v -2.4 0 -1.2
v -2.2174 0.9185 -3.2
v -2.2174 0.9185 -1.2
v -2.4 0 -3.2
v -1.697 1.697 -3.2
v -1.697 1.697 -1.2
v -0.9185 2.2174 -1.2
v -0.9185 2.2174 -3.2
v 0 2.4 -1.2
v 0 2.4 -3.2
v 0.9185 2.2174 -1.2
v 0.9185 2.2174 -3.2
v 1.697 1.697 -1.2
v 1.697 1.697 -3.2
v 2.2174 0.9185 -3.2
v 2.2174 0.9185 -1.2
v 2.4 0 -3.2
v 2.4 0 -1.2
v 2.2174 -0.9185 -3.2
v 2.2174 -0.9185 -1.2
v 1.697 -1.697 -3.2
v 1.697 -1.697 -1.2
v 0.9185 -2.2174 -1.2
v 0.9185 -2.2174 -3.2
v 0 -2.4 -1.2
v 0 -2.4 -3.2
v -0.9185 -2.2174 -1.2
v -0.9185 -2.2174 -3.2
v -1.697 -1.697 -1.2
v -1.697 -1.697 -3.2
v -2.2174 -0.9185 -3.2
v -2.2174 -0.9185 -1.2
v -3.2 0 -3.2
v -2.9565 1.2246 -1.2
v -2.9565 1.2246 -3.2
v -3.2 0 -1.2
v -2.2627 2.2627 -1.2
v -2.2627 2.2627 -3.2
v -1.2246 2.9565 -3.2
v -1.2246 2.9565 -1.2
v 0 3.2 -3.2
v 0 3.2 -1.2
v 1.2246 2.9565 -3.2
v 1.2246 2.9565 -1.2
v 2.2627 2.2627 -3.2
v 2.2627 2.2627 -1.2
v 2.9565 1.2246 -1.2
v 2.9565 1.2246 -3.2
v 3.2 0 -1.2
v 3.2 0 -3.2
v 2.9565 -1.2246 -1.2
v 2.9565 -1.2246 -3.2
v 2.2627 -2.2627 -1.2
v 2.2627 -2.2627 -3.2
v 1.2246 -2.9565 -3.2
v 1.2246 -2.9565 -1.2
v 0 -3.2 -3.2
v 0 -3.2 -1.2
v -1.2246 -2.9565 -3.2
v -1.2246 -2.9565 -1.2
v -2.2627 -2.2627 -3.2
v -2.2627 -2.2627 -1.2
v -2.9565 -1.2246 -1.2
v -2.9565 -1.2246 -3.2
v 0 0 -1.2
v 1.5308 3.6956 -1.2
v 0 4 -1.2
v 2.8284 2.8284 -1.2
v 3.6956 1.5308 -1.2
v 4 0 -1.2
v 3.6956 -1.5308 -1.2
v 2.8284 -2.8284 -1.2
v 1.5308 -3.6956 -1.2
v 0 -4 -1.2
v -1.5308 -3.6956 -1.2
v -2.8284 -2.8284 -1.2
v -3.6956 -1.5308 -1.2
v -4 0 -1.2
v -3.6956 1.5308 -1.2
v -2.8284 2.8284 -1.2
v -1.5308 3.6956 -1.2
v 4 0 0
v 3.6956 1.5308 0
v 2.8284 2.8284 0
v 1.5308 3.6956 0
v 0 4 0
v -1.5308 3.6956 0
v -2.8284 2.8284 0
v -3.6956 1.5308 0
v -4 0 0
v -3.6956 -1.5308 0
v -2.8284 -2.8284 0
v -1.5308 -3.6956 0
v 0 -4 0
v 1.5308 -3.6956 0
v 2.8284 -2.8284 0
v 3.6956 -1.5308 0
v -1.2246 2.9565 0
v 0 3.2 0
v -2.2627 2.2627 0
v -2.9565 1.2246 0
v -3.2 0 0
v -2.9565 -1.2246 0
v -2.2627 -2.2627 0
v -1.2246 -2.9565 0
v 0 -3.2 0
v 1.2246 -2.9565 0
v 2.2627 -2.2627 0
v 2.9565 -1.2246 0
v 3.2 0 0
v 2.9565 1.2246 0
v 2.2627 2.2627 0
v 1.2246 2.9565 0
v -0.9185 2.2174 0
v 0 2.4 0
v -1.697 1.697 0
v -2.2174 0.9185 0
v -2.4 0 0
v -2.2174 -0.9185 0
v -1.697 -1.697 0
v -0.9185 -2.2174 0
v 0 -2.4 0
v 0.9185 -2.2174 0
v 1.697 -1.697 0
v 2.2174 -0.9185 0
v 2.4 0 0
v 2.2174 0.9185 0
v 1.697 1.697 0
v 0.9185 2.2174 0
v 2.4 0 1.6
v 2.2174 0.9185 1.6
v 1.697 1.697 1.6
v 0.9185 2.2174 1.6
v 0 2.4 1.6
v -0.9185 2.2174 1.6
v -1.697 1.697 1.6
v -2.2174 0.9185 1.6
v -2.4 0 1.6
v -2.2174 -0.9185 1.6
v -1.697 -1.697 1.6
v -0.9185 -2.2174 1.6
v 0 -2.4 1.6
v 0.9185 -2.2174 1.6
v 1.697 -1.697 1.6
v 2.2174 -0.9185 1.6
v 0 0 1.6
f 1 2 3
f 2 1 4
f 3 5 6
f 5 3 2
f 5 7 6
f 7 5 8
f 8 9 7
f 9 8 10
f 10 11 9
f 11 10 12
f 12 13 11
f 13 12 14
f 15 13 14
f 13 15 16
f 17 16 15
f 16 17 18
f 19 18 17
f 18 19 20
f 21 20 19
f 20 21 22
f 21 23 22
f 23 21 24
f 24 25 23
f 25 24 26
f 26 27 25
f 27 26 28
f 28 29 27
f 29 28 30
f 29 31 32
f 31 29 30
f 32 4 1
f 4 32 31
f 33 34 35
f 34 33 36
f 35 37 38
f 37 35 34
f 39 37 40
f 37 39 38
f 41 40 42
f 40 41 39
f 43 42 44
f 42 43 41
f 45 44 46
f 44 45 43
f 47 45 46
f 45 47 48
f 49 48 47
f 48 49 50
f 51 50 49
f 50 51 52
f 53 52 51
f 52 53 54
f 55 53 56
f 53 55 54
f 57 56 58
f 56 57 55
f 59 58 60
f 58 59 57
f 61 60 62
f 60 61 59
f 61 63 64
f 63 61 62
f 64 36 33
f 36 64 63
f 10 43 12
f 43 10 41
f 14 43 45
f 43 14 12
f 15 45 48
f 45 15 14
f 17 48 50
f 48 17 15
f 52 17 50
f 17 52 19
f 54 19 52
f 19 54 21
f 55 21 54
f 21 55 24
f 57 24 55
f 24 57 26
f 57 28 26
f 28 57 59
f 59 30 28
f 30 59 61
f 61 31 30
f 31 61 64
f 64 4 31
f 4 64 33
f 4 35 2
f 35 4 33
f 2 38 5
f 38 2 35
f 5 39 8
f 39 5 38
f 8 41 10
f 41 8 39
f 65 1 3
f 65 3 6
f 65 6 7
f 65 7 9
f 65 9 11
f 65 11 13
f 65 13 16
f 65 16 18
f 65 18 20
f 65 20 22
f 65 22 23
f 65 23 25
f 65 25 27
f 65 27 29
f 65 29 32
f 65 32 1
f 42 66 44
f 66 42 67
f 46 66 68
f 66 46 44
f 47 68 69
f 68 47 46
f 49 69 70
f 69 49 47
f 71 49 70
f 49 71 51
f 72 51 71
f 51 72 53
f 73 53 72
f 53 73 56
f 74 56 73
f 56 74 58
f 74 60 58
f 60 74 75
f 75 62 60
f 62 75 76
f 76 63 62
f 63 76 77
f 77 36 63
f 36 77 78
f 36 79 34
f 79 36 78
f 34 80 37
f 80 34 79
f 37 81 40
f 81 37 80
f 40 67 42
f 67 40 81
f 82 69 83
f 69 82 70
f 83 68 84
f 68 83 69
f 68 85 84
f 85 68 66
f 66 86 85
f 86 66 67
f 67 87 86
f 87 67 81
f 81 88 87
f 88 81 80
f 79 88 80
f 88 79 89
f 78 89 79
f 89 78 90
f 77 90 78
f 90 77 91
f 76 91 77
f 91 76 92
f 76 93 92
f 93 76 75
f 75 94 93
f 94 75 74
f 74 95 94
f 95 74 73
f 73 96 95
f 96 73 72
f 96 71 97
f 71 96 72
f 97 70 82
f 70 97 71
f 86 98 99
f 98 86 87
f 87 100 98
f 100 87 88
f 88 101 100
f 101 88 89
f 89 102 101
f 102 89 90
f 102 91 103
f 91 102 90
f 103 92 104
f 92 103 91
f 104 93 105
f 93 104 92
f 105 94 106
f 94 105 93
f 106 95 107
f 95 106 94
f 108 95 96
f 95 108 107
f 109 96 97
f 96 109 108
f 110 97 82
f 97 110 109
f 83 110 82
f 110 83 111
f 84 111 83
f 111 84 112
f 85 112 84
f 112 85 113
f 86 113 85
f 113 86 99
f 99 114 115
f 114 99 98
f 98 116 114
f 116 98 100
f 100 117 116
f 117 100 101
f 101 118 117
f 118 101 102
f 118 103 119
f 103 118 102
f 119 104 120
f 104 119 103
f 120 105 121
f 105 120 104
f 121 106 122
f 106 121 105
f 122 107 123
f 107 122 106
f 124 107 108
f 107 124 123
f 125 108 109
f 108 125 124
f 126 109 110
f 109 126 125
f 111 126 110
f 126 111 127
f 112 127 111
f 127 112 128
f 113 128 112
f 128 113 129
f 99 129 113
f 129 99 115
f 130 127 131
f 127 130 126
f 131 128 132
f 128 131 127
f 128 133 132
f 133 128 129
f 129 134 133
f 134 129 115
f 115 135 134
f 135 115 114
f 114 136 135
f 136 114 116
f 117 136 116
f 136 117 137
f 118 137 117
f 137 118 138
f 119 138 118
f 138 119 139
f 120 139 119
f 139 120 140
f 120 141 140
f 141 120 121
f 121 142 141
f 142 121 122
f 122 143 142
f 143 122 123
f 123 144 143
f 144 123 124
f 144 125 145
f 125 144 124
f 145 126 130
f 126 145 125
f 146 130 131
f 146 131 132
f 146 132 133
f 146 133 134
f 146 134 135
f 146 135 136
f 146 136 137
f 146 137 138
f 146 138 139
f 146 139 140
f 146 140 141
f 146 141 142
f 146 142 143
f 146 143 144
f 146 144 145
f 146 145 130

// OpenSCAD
// file: ../p/4-4edge.scad
use <../lib.scad>
function ldraw_lib__4_4edge() = [
// 0 Circle 1.0
// 0 Name: 4-4edge.dat
// 0 Author: James Jessiman
// 0 !LDRAW_ORG Primitive UPDATE 2017-01
// 0 !LICENSE Licensed under CC BY 2.0 and CC BY 4.0 : see CAreadme.txt
// 
// 0 BFC CERTIFY CCW
  [0,"BFC","CERTIFY"],
  [0,"BFC","CCW"],
// 
// 0 !HISTORY 1998-12-15 [PTadmin] Official Update 1998-10
// 0 !HISTORY 2005-12-28 [PTadmin] Official Update 2005-01
// 0 !HISTORY 2007-06-24 [PTadmin] Header formatted for Contributor Agreement
// 0 !HISTORY 2008-07-01 [PTadmin] Official Update 2008-01
// 0 !HISTORY 2017-01-15 [Steffen] BFCed
// 0 !HISTORY 2017-12-30 [PTadmin] Official Update 2017-01
// 
// 
// 2 24 1 0 0 0.9239 0 0.3827
  [2,24,1,0,0,0.9239,0,0.3827],
// 2 24 0.9239 0 0.3827 0.7071 0 0.7071
  [2,24,0.9239,0,0.3827,0.7071,0,0.7071],
// 2 24 0.7071 0 0.7071 0.3827 0 0.9239
  [2,24,0.7071,0,0.7071,0.3827,0,0.9239],
// 2 24 0.3827 0 0.9239 0 0 1
  [2,24,0.3827,0,0.9239,0,0,1],
// 2 24 0 0 1 -0.3827 0 0.9239
  [2,24,0,0,1,-0.3827,0,0.9239],
// 2 24 -0.3827 0 0.9239 -0.7071 0 0.7071
  [2,24,-0.3827,0,0.9239,-0.7071,0,0.7071],
// 2 24 -0.7071 0 0.7071 -0.9239 0 0.3827
  [2,24,-0.7071,0,0.7071,-0.9239,0,0.3827],
// 2 24 -0.9239 0 0.3827 -1 0 -0
  [2,24,-0.9239,0,0.3827,-1,0,-0],
// 2 24 -1 0 -0 -0.9239 0 -0.3827
  [2,24,-1,0,-0,-0.9239,0,-0.3827],
// 2 24 -0.9239 0 -0.3827 -0.7071 0 -0.7071
  [2,24,-0.9239,0,-0.3827,-0.7071,0,-0.7071],
// 2 24 -0.7071 0 -0.7071 -0.3827 0 -0.9239
  [2,24,-0.7071,0,-0.7071,-0.3827,0,-0.9239],
// 2 24 -0.3827 0 -0.9239 0 0 -1
  [2,24,-0.3827,0,-0.9239,0,0,-1],
// 2 24 0 0 -1 0.3827 0 -0.9239
  [2,24,0,0,-1,0.3827,0,-0.9239],
// 2 24 0.3827 0 -0.9239 0.7071 0 -0.7071
  [2,24,0.3827,0,-0.9239,0.7071,0,-0.7071],
// 2 24 0.7071 0 -0.7071 0.9239 0 -0.3827
  [2,24,0.7071,0,-0.7071,0.9239,0,-0.3827],
// 2 24 0.9239 0 -0.3827 1 0 0
  [2,24,0.9239,0,-0.3827,1,0,0],
];
makepoly(ldraw_lib__4_4edge(), line=0.2);
// file: ../p/4-4cyli.scad
use <../lib.scad>
function ldraw_lib__4_4cyli() = [
// 0 Cylinder 1.0
// 0 Name: 4-4cyli.dat
// 0 Author: James Jessiman
// 0 !LDRAW_ORG Primitive UPDATE 2005-01
// 0 !LICENSE Licensed under CC BY 2.0 and CC BY 4.0 : see CAreadme.txt
// 
// 0 BFC CERTIFY CCW
  [0,"BFC","CERTIFY"],
  [0,"BFC","CCW"],
// 
// 0 !HISTORY 1998-12-15 [PTadmin] Official Update 1998-10
// 0 !HISTORY 2002-03-23 [sbliss] Added BFC statement; merged headers from files in distributions LDraw 0.27 and Complete.
// 0 !HISTORY 2002-04-25 [PTadmin] Official Update 2002-02
// 0 !HISTORY 2004-12-14 [guyvivan] BFC CCW
// 0 !HISTORY 2005-12-28 [PTadmin] Official Update 2005-01
// 0 !HISTORY 2007-06-24 [PTadmin] Header formatted for Contributor Agreement
// 0 !HISTORY 2008-07-01 [PTadmin] Official Update 2008-01
// 
// 
// 4 16 1 1 0 0.9239 1 0.3827 0.9239 0 0.3827 1 0 0
  [4,16,1,1,0,0.9239,1,0.3827,0.9239,0,0.3827,1,0,0],
// 5 24 1 0 0 1 1 0 0.9239 0 0.3827 0.9239 0 -0.3827
  [5,24,1,0,0,1,1,0,0.9239,0,0.3827,0.9239,0,-0.3827],
// 4 16 0.9239 1 0.3827 0.7071 1 0.7071 0.7071 0 0.7071 0.9239 0 0.3827
  [4,16,0.9239,1,0.3827,0.7071,1,0.7071,0.7071,0,0.7071,0.9239,0,0.3827],
// 5 24 0.9239 0 0.3827 0.9239 1 0.3827 0.7071 0 0.7071 1 0 0
  [5,24,0.9239,0,0.3827,0.9239,1,0.3827,0.7071,0,0.7071,1,0,0],
// 4 16 0.7071 1 0.7071 0.3827 1 0.9239 0.3827 0 0.9239 0.7071 0 0.7071
  [4,16,0.7071,1,0.7071,0.3827,1,0.9239,0.3827,0,0.9239,0.7071,0,0.7071],
// 5 24 0.7071 0 0.7071 0.7071 1 0.7071 0.3827 0 0.9239 0.9239 0 0.3827
  [5,24,0.7071,0,0.7071,0.7071,1,0.7071,0.3827,0,0.9239,0.9239,0,0.3827],
// 4 16 0.3827 1 0.9239 0 1 1 0 0 1 0.3827 0 0.9239
  [4,16,0.3827,1,0.9239,0,1,1,0,0,1,0.3827,0,0.9239],
// 5 24 0.3827 0 0.9239 0.3827 1 0.9239 0 0 1 0.7071 0 0.7071
  [5,24,0.3827,0,0.9239,0.3827,1,0.9239,0,0,1,0.7071,0,0.7071],
// 4 16 0 1 1 -0.3827 1 0.9239 -0.3827 0 0.9239 0 0 1
  [4,16,0,1,1,-0.3827,1,0.9239,-0.3827,0,0.9239,0,0,1],
// 5 24 0 0 1 0 1 1 -0.3827 0 0.9239 0.3827 0 0.9239
  [5,24,0,0,1,0,1,1,-0.3827,0,0.9239,0.3827,0,0.9239],
// 4 16 -0.3827 1 0.9239 -0.7071 1 0.7071 -0.7071 0 0.7071 -0.3827 0 0.9239
  [4,16,-0.3827,1,0.9239,-0.7071,1,0.7071,-0.7071,0,0.7071,-0.3827,0,0.9239],
// 5 24 -0.3827 0 0.9239 -0.3827 1 0.9239 -0.7071 0 0.7071 0 0 1
  [5,24,-0.3827,0,0.9239,-0.3827,1,0.9239,-0.7071,0,0.7071,0,0,1],
// 4 16 -0.7071 1 0.7071 -0.9239 1 0.3827 -0.9239 0 0.3827 -0.7071 0 0.7071
  [4,16,-0.7071,1,0.7071,-0.9239,1,0.3827,-0.9239,0,0.3827,-0.7071,0,0.7071],
// 5 24 -0.7071 0 0.7071 -0.7071 1 0.7071 -0.9239 0 0.3827 -0.3827 0 0.9239
  [5,24,-0.7071,0,0.7071,-0.7071,1,0.7071,-0.9239,0,0.3827,-0.3827,0,0.9239],
// 4 16 -0.9239 1 0.3827 -1 1 0 -1 0 0 -0.9239 0 0.3827
  [4,16,-0.9239,1,0.3827,-1,1,0,-1,0,0,-0.9239,0,0.3827],
// 5 24 -0.9239 0 0.3827 -0.9239 1 0.3827 -1 0 0 -0.7071 0 0.7071
  [5,24,-0.9239,0,0.3827,-0.9239,1,0.3827,-1,0,0,-0.7071,0,0.7071],
// 4 16 -1 1 0 -0.9239 1 -0.3827 -0.9239 0 -0.3827 -1 0 0
  [4,16,-1,1,0,-0.9239,1,-0.3827,-0.9239,0,-0.3827,-1,0,0],
// 5 24 -1 0 0 -1 1 0 -0.9239 0 -0.3827 -0.9239 0 0.3827
  [5,24,-1,0,0,-1,1,0,-0.9239,0,-0.3827,-0.9239,0,0.3827],
// 4 16 -0.9239 1 -0.3827 -0.7071 1 -0.7071 -0.7071 0 -0.7071 -0.9239 0 -0.3827
  [4,16,-0.9239,1,-0.3827,-0.7071,1,-0.7071,-0.7071,0,-0.7071,-0.9239,0,-0.3827],
// 5 24 -0.9239 0 -0.3827 -0.9239 1 -0.3827 -0.7071 0 -0.7071 -1 0 0
  [5,24,-0.9239,0,-0.3827,-0.9239,1,-0.3827,-0.7071,0,-0.7071,-1,0,0],
// 4 16 -0.7071 1 -0.7071 -0.3827 1 -0.9239 -0.3827 0 -0.9239 -0.7071 0 -0.7071
  [4,16,-0.7071,1,-0.7071,-0.3827,1,-0.9239,-0.3827,0,-0.9239,-0.7071,0,-0.7071],
// 5 24 -0.7071 0 -0.7071 -0.7071 1 -0.7071 -0.3827 0 -0.9239 -0.9239 0 -0.3827
  [5,24,-0.7071,0,-0.7071,-0.7071,1,-0.7071,-0.3827,0,-0.9239,-0.9239,0,-0.3827],
// 4 16 -0.3827 1 -0.9239 0 1 -1 0 0 -1 -0.3827 0 -0.9239
  [4,16,-0.3827,1,-0.9239,0,1,-1,0,0,-1,-0.3827,0,-0.9239],
// 5 24 -0.3827 0 -0.9239 -0.3827 1 -0.9239 0 0 -1 -0.7071 0 -0.7071
  [5,24,-0.3827,0,-0.9239,-0.3827,1,-0.9239,0,0,-1,-0.7071,0,-0.7071],
// 4 16 0 1 -1 0.3827 1 -0.9239 0.3827 0 -0.9239 0 0 -1
  [4,16,0,1,-1,0.3827,1,-0.9239,0.3827,0,-0.9239,0,0,-1],
// 5 24 0 0 -1 0 1 -1 0.3827 0 -0.9239 -0.3827 0 -0.9239
  [5,24,0,0,-1,0,1,-1,0.3827,0,-0.9239,-0.3827,0,-0.9239],
// 4 16 0.3827 1 -0.9239 0.7071 1 -0.7071 0.7071 0 -0.7071 0.3827 0 -0.9239
  [4,16,0.3827,1,-0.9239,0.7071,1,-0.7071,0.7071,0,-0.7071,0.3827,0,-0.9239],
// 5 24 0.3827 0 -0.9239 0.3827 1 -0.9239 0.7071 0 -0.7071 0 0 -1
  [5,24,0.3827,0,-0.9239,0.3827,1,-0.9239,0.7071,0,-0.7071,0,0,-1],
// 4 16 0.7071 1 -0.7071 0.9239 1 -0.3827 0.9239 0 -0.3827 0.7071 0 -0.7071
  [4,16,0.7071,1,-0.7071,0.9239,1,-0.3827,0.9239,0,-0.3827,0.7071,0,-0.7071],
// 5 24 0.7071 0 -0.7071 0.7071 1 -0.7071 0.9239 0 -0.3827 0.3827 0 -0.9239
  [5,24,0.7071,0,-0.7071,0.7071,1,-0.7071,0.9239,0,-0.3827,0.3827,0,-0.9239],
// 4 16 0.9239 1 -0.3827 1 1 0 1 0 0 0.9239 0 -0.3827
  [4,16,0.9239,1,-0.3827,1,1,0,1,0,0,0.9239,0,-0.3827],
// 5 24 0.9239 0 -0.3827 0.9239 1 -0.3827 1 0 0 0.7071 0 -0.7071
  [5,24,0.9239,0,-0.3827,0.9239,1,-0.3827,1,0,0,0.7071,0,-0.7071],
// 0
];
makepoly(ldraw_lib__4_4cyli(), line=0.2);
// file: ../p/stud4.scad
use <../lib.scad>
use <4-4cyli.scad>
use <4-4edge.scad>
use <4-4ring3.scad>
function ldraw_lib__stud4() = [
// 0 Stud Tube Open
// 0 Name: stud4.dat
// 0 Author: James Jessiman
// 0 !LDRAW_ORG Primitive UPDATE 2009-02
// 0 !LICENSE Licensed under CC BY 2.0 and CC BY 4.0 : see CAreadme.txt
// 
// 0 BFC CERTIFY CCW
  [0,"BFC","CERTIFY"],
  [0,"BFC","CCW"],
// 
// 0 !HISTORY 1999-07-05 [PTadmin] Official Update 1999-05
// 0 !HISTORY 2002-04-04 [sbliss] Modified for BFC compliance
// 0 !HISTORY 2002-04-25 [PTadmin] Official Update 2002-02
// 0 !HISTORY 2007-06-24 [PTadmin] Header formatted for Contributor Agreement
// 0 !HISTORY 2008-07-01 [PTadmin] Official Update 2008-01
// 0 !HISTORY 2009-06-21 [cwdee] Update ring references to 4-4ring
// 0 !HISTORY 2009-09-03 [PTadmin] Official Update 2009-02
// 
// 
// 1 16 0 -4 0 6 0 0 0 1 0 0 0 6 4-4edge.dat
  [1,16,0,-4,0,6,0,0,0,1,0,0,0,6, ldraw_lib__4_4edge()],
// 1 16 0 -4 0 8 0 0 0 1 0 0 0 8 4-4edge.dat
  [1,16,0,-4,0,8,0,0,0,1,0,0,0,8, ldraw_lib__4_4edge()],
// 1 16 0 0 0 6 0 0 0 1 0 0 0 6 4-4edge.dat
  [1,16,0,0,0,6,0,0,0,1,0,0,0,6, ldraw_lib__4_4edge()],
// 1 16 0 0 0 8 0 0 0 1 0 0 0 8 4-4edge.dat
  [1,16,0,0,0,8,0,0,0,1,0,0,0,8, ldraw_lib__4_4edge()],
// 0 BFC INVERTNEXT
  [0,"BFC","INVERTNEXT"],
// 1 16 0 -4 0 6 0 0 0 4 0 0 0 6 4-4cyli.dat
  [1,16,0,-4,0,6,0,0,0,4,0,0,0,6, ldraw_lib__4_4cyli()],
// 1 16 0 -4 0 8 0 0 0 4 0 0 0 8 4-4cyli.dat
  [1,16,0,-4,0,8,0,0,0,4,0,0,0,8, ldraw_lib__4_4cyli()],
// 1 16 0 -4 0 2 0 0 0 1 0 0 0 2 4-4ring3.dat
  [1,16,0,-4,0,2,0,0,0,1,0,0,0,2, ldraw_lib__4_4ring3()],
// 0
];
makepoly(ldraw_lib__stud4(), line=0.2);
// file: ../p/stud.scad
use <../lib.scad>
use <4-4cyli.scad>
use <4-4disc.scad>
use <4-4edge.scad>
function ldraw_lib__stud() = [
// 0 Stud
// 0 Name: stud.dat
// 0 Author: James Jessiman
// 0 !LDRAW_ORG Primitive UPDATE 2012-01
// 0 !LICENSE Licensed under CC BY 2.0 and CC BY 4.0 : see CAreadme.txt
// 
// 0 BFC CERTIFY CCW
  [0,"BFC","CERTIFY"],
  [0,"BFC","CCW"],
// 
// 0 !HISTORY 2002-04-04 [sbliss] Modified for BFC compliance
// 0 !HISTORY 2002-04-25 [PTadmin] Official Update 2002-02
// 0 !HISTORY 2007-06-24 [PTadmin] Header formatted for Contributor Agreement
// 0 !HISTORY 2008-07-01 [PTadmin] Official Update 2008-01
// 0 !HISTORY 2012-02-16 [Philo] Changed to CCW
// 0 !HISTORY 2012-03-30 [PTadmin] Official Update 2012-01
// 
// 
// 1 16 0 0 0 6 0 0 0 1 0 0 0 6 4-4edge.dat
  [1,16,0,0,0,6,0,0,0,1,0,0,0,6, ldraw_lib__4_4edge()],
// 1 16 0 -4 0 6 0 0 0 1 0 0 0 6 4-4edge.dat
  [1,16,0,-4,0,6,0,0,0,1,0,0,0,6, ldraw_lib__4_4edge()],
// 1 16 0 0 0 6 0 0 0 -4 0 0 0 6 4-4cyli.dat
  [1,16,0,0,0,6,0,0,0,-4,0,0,0,6, ldraw_lib__4_4cyli()],
// 1 16 0 -4 0 6 0 0 0 1 0 0 0 6 4-4disc.dat
  [1,16,0,-4,0,6,0,0,0,1,0,0,0,6, ldraw_lib__4_4disc()],
];
makepoly(ldraw_lib__stud(), line=0.2);
// file: ../p/4-4ring4.scad
use <../lib.scad>
function ldraw_lib__4_4ring4() = [
// 0 Ring  4 x 1.0
// 0 Name: 4-4ring4.dat
// 0 Author: James Jessiman
// 0 !LDRAW_ORG Primitive UPDATE 2009-01
// 0 !LICENSE Licensed under CC BY 2.0 and CC BY 4.0 : see CAreadme.txt
// 
// 0 BFC CERTIFY CCW
  [0,"BFC","CERTIFY"],
  [0,"BFC","CCW"],
// 
// 0 !HISTORY 1998-12-15 [PTadmin] Official Update 1998-10
// 0 !HISTORY 2002-04-08 [BrickCaster] Modified for BFC compliance
// 0 !HISTORY 2002-04-25 [PTadmin] Official Update 2002-02
// 0 !HISTORY 2007-06-24 [PTadmin] Header formatted for Contributor Agreement
// 0 !HISTORY 2008-07-01 [PTadmin] Official Update 2008-01
// 0 !HISTORY 2008-08-26 [cwdee] Switch polygon winding and rename
// 0 !HISTORY 2009-05-02 [PTadmin] Official Update 2009-01
// 
// 
// 4 16 -1.9135 0 4.6195 -1.5308 0 3.6956 0 0 4 0 0 5
  [4,16,-1.9135,0,4.6195,-1.5308,0,3.6956,0,0,4,0,0,5],
// 4 16 -3.5355 0 3.5355 -2.8284 0 2.8284 -1.5308 0 3.6956 -1.9135 0 4.6195
  [4,16,-3.5355,0,3.5355,-2.8284,0,2.8284,-1.5308,0,3.6956,-1.9135,0,4.6195],
// 4 16 -4.6195 0 1.9135 -3.6956 0 1.5308 -2.8284 0 2.8284 -3.5355 0 3.5355
  [4,16,-4.6195,0,1.9135,-3.6956,0,1.5308,-2.8284,0,2.8284,-3.5355,0,3.5355],
// 4 16 -5 0 0 -4 0 0 -3.6956 0 1.5308 -4.6195 0 1.9135
  [4,16,-5,0,0,-4,0,0,-3.6956,0,1.5308,-4.6195,0,1.9135],
// 4 16 -4.6195 0 -1.9135 -3.6956 0 -1.5308 -4 0 0 -5 0 0
  [4,16,-4.6195,0,-1.9135,-3.6956,0,-1.5308,-4,0,0,-5,0,0],
// 4 16 -3.5355 0 -3.5355 -2.8284 0 -2.8284 -3.6956 0 -1.5308 -4.6195 0 -1.9135
  [4,16,-3.5355,0,-3.5355,-2.8284,0,-2.8284,-3.6956,0,-1.5308,-4.6195,0,-1.9135],
// 4 16 -1.9135 0 -4.6195 -1.5308 0 -3.6956 -2.8284 0 -2.8284 -3.5355 0 -3.5355
  [4,16,-1.9135,0,-4.6195,-1.5308,0,-3.6956,-2.8284,0,-2.8284,-3.5355,0,-3.5355],
// 4 16 0 0 -5 0 0 -4 -1.5308 0 -3.6956 -1.9135 0 -4.6195
  [4,16,0,0,-5,0,0,-4,-1.5308,0,-3.6956,-1.9135,0,-4.6195],
// 4 16 1.9135 0 -4.6195 1.5308 0 -3.6956 0 0 -4 0 0 -5
  [4,16,1.9135,0,-4.6195,1.5308,0,-3.6956,0,0,-4,0,0,-5],
// 4 16 3.5355 0 -3.5355 2.8284 0 -2.8284 1.5308 0 -3.6956 1.9135 0 -4.6195
  [4,16,3.5355,0,-3.5355,2.8284,0,-2.8284,1.5308,0,-3.6956,1.9135,0,-4.6195],
// 4 16 4.6195 0 -1.9135 3.6956 0 -1.5308 2.8284 0 -2.8284 3.5355 0 -3.5355
  [4,16,4.6195,0,-1.9135,3.6956,0,-1.5308,2.8284,0,-2.8284,3.5355,0,-3.5355],
// 4 16 5 0 0 4 0 0 3.6956 0 -1.5308 4.6195 0 -1.9135
  [4,16,5,0,0,4,0,0,3.6956,0,-1.5308,4.6195,0,-1.9135],
// 4 16 4.6195 0 1.9135 3.6956 0 1.5308 4 0 0 5 0 0
  [4,16,4.6195,0,1.9135,3.6956,0,1.5308,4,0,0,5,0,0],
// 4 16 3.5355 0 3.5355 2.8284 0 2.8284 3.6956 0 1.5308 4.6195 0 1.9135
  [4,16,3.5355,0,3.5355,2.8284,0,2.8284,3.6956,0,1.5308,4.6195,0,1.9135],
// 4 16 1.9135 0 4.6195 1.5308 0 3.6956 2.8284 0 2.8284 3.5355 0 3.5355
  [4,16,1.9135,0,4.6195,1.5308,0,3.6956,2.8284,0,2.8284,3.5355,0,3.5355],
// 4 16 0 0 5 0 0 4 1.5308 0 3.6956 1.9135 0 4.6195
  [4,16,0,0,5,0,0,4,1.5308,0,3.6956,1.9135,0,4.6195],
// 0
];
makepoly(ldraw_lib__4_4ring4(), line=0.2);
// file: ../p/4-4ring3.scad
use <../lib.scad>
function ldraw_lib__4_4ring3() = [
// 0 Ring  3 x 1.0
// 0 Name: 4-4ring3.dat
// 0 Author: James Jessiman
// 0 !LDRAW_ORG Primitive UPDATE 2009-01
// 0 !LICENSE Licensed under CC BY 2.0 and CC BY 4.0 : see CAreadme.txt
// 
// 0 BFC CERTIFY CCW
  [0,"BFC","CERTIFY"],
  [0,"BFC","CCW"],
// 
// 0 !HISTORY 1998-12-15 [PTadmin] Official Update 1998-10
// 0 !HISTORY 2002-04-05 [hafhead] Added BFC statement
// 0 !HISTORY 2002-04-25 [PTadmin] Official Update 2002-02
// 0 !HISTORY 2007-06-24 [PTadmin] Header formatted for Contributor Agreement
// 0 !HISTORY 2008-07-01 [PTadmin] Official Update 2008-01
// 0 !HISTORY 2008-08-26 [cwdee] Switch polygon winding and rename
// 0 !HISTORY 2009-05-02 [PTadmin] Official Update 2009-01
// 
// 
// 4 16 -1.5308 0 3.6956 -1.1481 0 2.7717 0 0 3 0 0 4
  [4,16,-1.5308,0,3.6956,-1.1481,0,2.7717,0,0,3,0,0,4],
// 4 16 -2.8284 0 2.8284 -2.1213 0 2.1213 -1.1481 0 2.7717 -1.5308 0 3.6956
  [4,16,-2.8284,0,2.8284,-2.1213,0,2.1213,-1.1481,0,2.7717,-1.5308,0,3.6956],
// 4 16 -3.6956 0 1.5308 -2.7717 0 1.1481 -2.1213 0 2.1213 -2.8284 0 2.8284
  [4,16,-3.6956,0,1.5308,-2.7717,0,1.1481,-2.1213,0,2.1213,-2.8284,0,2.8284],
// 4 16 -4 0 0 -3 0 0 -2.7717 0 1.1481 -3.6956 0 1.5308
  [4,16,-4,0,0,-3,0,0,-2.7717,0,1.1481,-3.6956,0,1.5308],
// 4 16 -3.6956 0 -1.5308 -2.7717 0 -1.1481 -3 0 0 -4 0 0
  [4,16,-3.6956,0,-1.5308,-2.7717,0,-1.1481,-3,0,0,-4,0,0],
// 4 16 -2.8284 0 -2.8284 -2.1213 0 -2.1213 -2.7717 0 -1.1481 -3.6956 0 -1.5308
  [4,16,-2.8284,0,-2.8284,-2.1213,0,-2.1213,-2.7717,0,-1.1481,-3.6956,0,-1.5308],
// 4 16 -1.5308 0 -3.6956 -1.1481 0 -2.7717 -2.1213 0 -2.1213 -2.8284 0 -2.8284
  [4,16,-1.5308,0,-3.6956,-1.1481,0,-2.7717,-2.1213,0,-2.1213,-2.8284,0,-2.8284],
// 4 16 0 0 -4 0 0 -3 -1.1481 0 -2.7717 -1.5308 0 -3.6956
  [4,16,0,0,-4,0,0,-3,-1.1481,0,-2.7717,-1.5308,0,-3.6956],
// 4 16 1.5308 0 -3.6956 1.1481 0 -2.7717 0 0 -3 0 0 -4
  [4,16,1.5308,0,-3.6956,1.1481,0,-2.7717,0,0,-3,0,0,-4],
// 4 16 2.8284 0 -2.8284 2.1213 0 -2.1213 1.1481 0 -2.7717 1.5308 0 -3.6956
  [4,16,2.8284,0,-2.8284,2.1213,0,-2.1213,1.1481,0,-2.7717,1.5308,0,-3.6956],
// 4 16 3.6956 0 -1.5308 2.7717 0 -1.1481 2.1213 0 -2.1213 2.8284 0 -2.8284
  [4,16,3.6956,0,-1.5308,2.7717,0,-1.1481,2.1213,0,-2.1213,2.8284,0,-2.8284],
// 4 16 4 0 0 3 0 0 2.7717 0 -1.1481 3.6956 0 -1.5308
  [4,16,4,0,0,3,0,0,2.7717,0,-1.1481,3.6956,0,-1.5308],
// 4 16 3.6956 0 1.5308 2.7717 0 1.1481 3 0 0 4 0 0
  [4,16,3.6956,0,1.5308,2.7717,0,1.1481,3,0,0,4,0,0],
// 4 16 2.8284 0 2.8284 2.1213 0 2.1213 2.7717 0 1.1481 3.6956 0 1.5308
  [4,16,2.8284,0,2.8284,2.1213,0,2.1213,2.7717,0,1.1481,3.6956,0,1.5308],
// 4 16 1.5308 0 3.6956 1.1481 0 2.7717 2.1213 0 2.1213 2.8284 0 2.8284
  [4,16,1.5308,0,3.6956,1.1481,0,2.7717,2.1213,0,2.1213,2.8284,0,2.8284],
// 4 16 0 0 4 0 0 3 1.1481 0 2.7717 1.5308 0 3.6956
  [4,16,0,0,4,0,0,3,1.1481,0,2.7717,1.5308,0,3.6956],
// 0
];
makepoly(ldraw_lib__4_4ring3(), line=0.2);
// file: ../p/4-4disc.scad
use <../lib.scad>
function ldraw_lib__4_4disc() = [
// 0 Disc 1.0
// 0 Name: 4-4disc.dat
// 0 Author: James Jessiman
// 0 !LDRAW_ORG Primitive UPDATE 2002-02
// 0 !LICENSE Licensed under CC BY 2.0 and CC BY 4.0 : see CAreadme.txt
// 
// 0 BFC CERTIFY CCW
  [0,"BFC","CERTIFY"],
  [0,"BFC","CCW"],
// 
// 0 !HISTORY 1998-12-15 [PTadmin] Official Update 1998-10
// 0 !HISTORY 2002-03-23 [sbliss] Added BFC statement
// 0 !HISTORY 2002-04-25 [PTadmin] Official Update 2002-02
// 0 !HISTORY 2007-06-24 [PTadmin] Header formatted for Contributor Agreement
// 0 !HISTORY 2008-07-01 [PTadmin] Official Update 2008-01
// 
// 
// 3 16 0 0 0 1 0 0 0.9239 0 0.3827
  [3,16,0,0,0,1,0,0,0.9239,0,0.3827],
// 3 16 0 0 0 0.9239 0 0.3827 0.7071 0 0.7071
  [3,16,0,0,0,0.9239,0,0.3827,0.7071,0,0.7071],
// 3 16 0 0 0 0.7071 0 0.7071 0.3827 0 0.9239
  [3,16,0,0,0,0.7071,0,0.7071,0.3827,0,0.9239],
// 3 16 0 0 0 0.3827 0 0.9239 0 0 1
  [3,16,0,0,0,0.3827,0,0.9239,0,0,1],
// 3 16 0 0 0 0 0 1 -0.3827 0 0.9239
  [3,16,0,0,0,0,0,1,-0.3827,0,0.9239],
// 3 16 0 0 0 -0.3827 0 0.9239 -0.7071 0 0.7071
  [3,16,0,0,0,-0.3827,0,0.9239,-0.7071,0,0.7071],
// 3 16 0 0 0 -0.7071 0 0.7071 -0.9239 0 0.3827
  [3,16,0,0,0,-0.7071,0,0.7071,-0.9239,0,0.3827],
// 3 16 0 0 0 -0.9239 0 0.3827 -1 0 -0
  [3,16,0,0,0,-0.9239,0,0.3827,-1,0,-0],
// 3 16 0 0 0 -1 0 -0 -0.9239 0 -0.3827
  [3,16,0,0,0,-1,0,-0,-0.9239,0,-0.3827],
// 3 16 0 0 0 -0.9239 0 -0.3827 -0.7071 0 -0.7071
  [3,16,0,0,0,-0.9239,0,-0.3827,-0.7071,0,-0.7071],
// 3 16 0 0 0 -0.7071 0 -0.7071 -0.3827 0 -0.9239
  [3,16,0,0,0,-0.7071,0,-0.7071,-0.3827,0,-0.9239],
// 3 16 0 0 0 -0.3827 0 -0.9239 0 0 -1
  [3,16,0,0,0,-0.3827,0,-0.9239,0,0,-1],
// 3 16 0 0 0 0 0 -1 0.3827 0 -0.9239
  [3,16,0,0,0,0,0,-1,0.3827,0,-0.9239],
// 3 16 0 0 0 0.3827 0 -0.9239 0.7071 0 -0.7071
  [3,16,0,0,0,0.3827,0,-0.9239,0.7071,0,-0.7071],
// 3 16 0 0 0 0.7071 0 -0.7071 0.9239 0 -0.3827
  [3,16,0,0,0,0.7071,0,-0.7071,0.9239,0,-0.3827],
// 3 16 0 0 0 0.9239 0 -0.3827 1 0 0
  [3,16,0,0,0,0.9239,0,-0.3827,1,0,0],
// 0
];
makepoly(ldraw_lib__4_4disc(), line=0.2);
// file: ../p/4-4cylo.scad
use <../lib.scad>
use <4-4cyli.scad>
use <4-4edge.scad>
function ldraw_lib__4_4cylo() = [
// 0 Cylinder Open 1.0
// 0 Name: 4-4cylo.dat
// 0 Author: Mark Kennedy [mkennedy]
// 0 !LDRAW_ORG Primitive UPDATE 2010-01
// 0 !LICENSE Licensed under CC BY 2.0 and CC BY 4.0 : see CAreadme.txt
// 
// 0 BFC CERTIFY CCW
  [0,"BFC","CERTIFY"],
  [0,"BFC","CCW"],
// 
// 0 !HISTORY 2010-04-05 [PTadmin] Official Update 2010-01
// 
// 
// 1 16 0 0 0 1 0 0 0 1 0 0 0 1 4-4edge.dat
  [1,16,0,0,0,1,0,0,0,1,0,0,0,1, ldraw_lib__4_4edge()],
// 1 16 0 1 0 1 0 0 0 1 0 0 0 1 4-4edge.dat
  [1,16,0,1,0,1,0,0,0,1,0,0,0,1, ldraw_lib__4_4edge()],
// 1 16 0 0 0 1 0 0 0 1 0 0 0 1 4-4cyli.dat
  [1,16,0,0,0,1,0,0,0,1,0,0,0,1, ldraw_lib__4_4cyli()],
// 0
];
makepoly(ldraw_lib__4_4cylo(), line=0.2);
// file: 6141.scad
use <../lib.scad>
use <../p/4-4cylo.scad>
use <../p/4-4disc.scad>
use <../p/4-4ring3.scad>
use <../p/4-4ring4.scad>
use <../p/stud.scad>
use <../p/stud4.scad>
function ldraw_lib__6141() = [
// 0 Plate  1 x  1 Round
// 0 Name: 6141.dat
// 0 Author: James Jessiman
// 0 !LDRAW_ORG Part UPDATE 2015-01
// 0 !LICENSE Licensed under CC BY 2.0 and CC BY 4.0 : see CAreadme.txt
// 
// 0 BFC CERTIFY CCW
  [0,"BFC","CERTIFY"],
  [0,"BFC","CCW"],
// 
// 0 !HISTORY 1998-06-20 [PTadmin] Official Update 1998-06
// 0 !HISTORY 2003-01-29 [sbliss] Completed header; BFC'ed; misc cleanup
// 0 !HISTORY 2003-08-01 [PTadmin] Official Update 2003-02
// 0 !HISTORY 2007-10-26 [PTadmin] Header formatted for Contributor Agreement
// 0 !HISTORY 2008-07-01 [PTadmin] Official Update 2008-01
// 0 !HISTORY 2014-11-29 [Steffen] Renamed from 4073
// 0 !HISTORY 2014-12-28 [MagFors] Primitive substitution
// 0 !HISTORY 2015-10-11 [PTadmin] Official Update 2015-01
// 
// 
// 1 16 0 3 0 -1 0 0 0 -1.25 0 0 0 1 stud4.dat
  [1,16,0,3,0,-1,0,0,0,-1.25,0,0,0,1, ldraw_lib__stud4()],
// 1 16 0 3 0 -6 0 0 0 -1 0 0 0 6 4-4disc.dat
  [1,16,0,3,0,-6,0,0,0,-1,0,0,0,6, ldraw_lib__4_4disc()],
// 1 16 0 3 0 -2 0 0 0 -1 0 0 0 2 4-4ring4.dat
  [1,16,0,3,0,-2,0,0,0,-1,0,0,0,2, ldraw_lib__4_4ring4()],
// 1 16 0 0 0 10 0 0 0 3 0 0 0 10 4-4cylo.dat
  [1,16,0,0,0,10,0,0,0,3,0,0,0,10, ldraw_lib__4_4cylo()],
// 1 16 0 0 0 2 0 0 0 1 0 0 0 2 4-4ring4.dat
  [1,16,0,0,0,2,0,0,0,1,0,0,0,2, ldraw_lib__4_4ring4()],
// 1 16 0 0 0 2 0 0 0 1 0 0 0 2 4-4ring3.dat
  [1,16,0,0,0,2,0,0,0,1,0,0,0,2, ldraw_lib__4_4ring3()],
// 1 16 0 0 0 1 0 0 0 1 0 0 0 1 stud.dat
  [1,16,0,0,0,1,0,0,0,1,0,0,0,1, ldraw_lib__stud()],
];
makepoly(ldraw_lib__6141(), line=0.2);
// main file
use <../lib.scad>
use <6141.scad>
function ldraw_lib__51809() = [
// 0 =Plate  1 x  1 Round
// 0 Name: 51809.dat
// 0 Author: Rolf Osterthun [Rolf]
// 0 !LDRAW_ORG Part Alias UPDATE 2015-01
// 0 !LICENSE Licensed under CC BY 2.0 and CC BY 4.0 : see CAreadme.txt
// 
// 0 BFC CERTIFY CCW
  [0,"BFC","CERTIFY"],
  [0,"BFC","CCW"],
// 
// 0 !HISTORY 2015-10-11 [PTadmin] Official Update 2015-01
// 
// 
// 0 // Alias of 6141
// 0 // Part 51809 is the metallic lacquered counterpart of 6141
// 
// 1 16 0 0 0 1 0 0 0 1 0 0 0 1 6141.dat
  [1,16,0,0,0,1,0,0,0,1,0,0,0,1, ldraw_lib__6141()],
];
makepoly(ldraw_lib__51809(), line=0.2);
